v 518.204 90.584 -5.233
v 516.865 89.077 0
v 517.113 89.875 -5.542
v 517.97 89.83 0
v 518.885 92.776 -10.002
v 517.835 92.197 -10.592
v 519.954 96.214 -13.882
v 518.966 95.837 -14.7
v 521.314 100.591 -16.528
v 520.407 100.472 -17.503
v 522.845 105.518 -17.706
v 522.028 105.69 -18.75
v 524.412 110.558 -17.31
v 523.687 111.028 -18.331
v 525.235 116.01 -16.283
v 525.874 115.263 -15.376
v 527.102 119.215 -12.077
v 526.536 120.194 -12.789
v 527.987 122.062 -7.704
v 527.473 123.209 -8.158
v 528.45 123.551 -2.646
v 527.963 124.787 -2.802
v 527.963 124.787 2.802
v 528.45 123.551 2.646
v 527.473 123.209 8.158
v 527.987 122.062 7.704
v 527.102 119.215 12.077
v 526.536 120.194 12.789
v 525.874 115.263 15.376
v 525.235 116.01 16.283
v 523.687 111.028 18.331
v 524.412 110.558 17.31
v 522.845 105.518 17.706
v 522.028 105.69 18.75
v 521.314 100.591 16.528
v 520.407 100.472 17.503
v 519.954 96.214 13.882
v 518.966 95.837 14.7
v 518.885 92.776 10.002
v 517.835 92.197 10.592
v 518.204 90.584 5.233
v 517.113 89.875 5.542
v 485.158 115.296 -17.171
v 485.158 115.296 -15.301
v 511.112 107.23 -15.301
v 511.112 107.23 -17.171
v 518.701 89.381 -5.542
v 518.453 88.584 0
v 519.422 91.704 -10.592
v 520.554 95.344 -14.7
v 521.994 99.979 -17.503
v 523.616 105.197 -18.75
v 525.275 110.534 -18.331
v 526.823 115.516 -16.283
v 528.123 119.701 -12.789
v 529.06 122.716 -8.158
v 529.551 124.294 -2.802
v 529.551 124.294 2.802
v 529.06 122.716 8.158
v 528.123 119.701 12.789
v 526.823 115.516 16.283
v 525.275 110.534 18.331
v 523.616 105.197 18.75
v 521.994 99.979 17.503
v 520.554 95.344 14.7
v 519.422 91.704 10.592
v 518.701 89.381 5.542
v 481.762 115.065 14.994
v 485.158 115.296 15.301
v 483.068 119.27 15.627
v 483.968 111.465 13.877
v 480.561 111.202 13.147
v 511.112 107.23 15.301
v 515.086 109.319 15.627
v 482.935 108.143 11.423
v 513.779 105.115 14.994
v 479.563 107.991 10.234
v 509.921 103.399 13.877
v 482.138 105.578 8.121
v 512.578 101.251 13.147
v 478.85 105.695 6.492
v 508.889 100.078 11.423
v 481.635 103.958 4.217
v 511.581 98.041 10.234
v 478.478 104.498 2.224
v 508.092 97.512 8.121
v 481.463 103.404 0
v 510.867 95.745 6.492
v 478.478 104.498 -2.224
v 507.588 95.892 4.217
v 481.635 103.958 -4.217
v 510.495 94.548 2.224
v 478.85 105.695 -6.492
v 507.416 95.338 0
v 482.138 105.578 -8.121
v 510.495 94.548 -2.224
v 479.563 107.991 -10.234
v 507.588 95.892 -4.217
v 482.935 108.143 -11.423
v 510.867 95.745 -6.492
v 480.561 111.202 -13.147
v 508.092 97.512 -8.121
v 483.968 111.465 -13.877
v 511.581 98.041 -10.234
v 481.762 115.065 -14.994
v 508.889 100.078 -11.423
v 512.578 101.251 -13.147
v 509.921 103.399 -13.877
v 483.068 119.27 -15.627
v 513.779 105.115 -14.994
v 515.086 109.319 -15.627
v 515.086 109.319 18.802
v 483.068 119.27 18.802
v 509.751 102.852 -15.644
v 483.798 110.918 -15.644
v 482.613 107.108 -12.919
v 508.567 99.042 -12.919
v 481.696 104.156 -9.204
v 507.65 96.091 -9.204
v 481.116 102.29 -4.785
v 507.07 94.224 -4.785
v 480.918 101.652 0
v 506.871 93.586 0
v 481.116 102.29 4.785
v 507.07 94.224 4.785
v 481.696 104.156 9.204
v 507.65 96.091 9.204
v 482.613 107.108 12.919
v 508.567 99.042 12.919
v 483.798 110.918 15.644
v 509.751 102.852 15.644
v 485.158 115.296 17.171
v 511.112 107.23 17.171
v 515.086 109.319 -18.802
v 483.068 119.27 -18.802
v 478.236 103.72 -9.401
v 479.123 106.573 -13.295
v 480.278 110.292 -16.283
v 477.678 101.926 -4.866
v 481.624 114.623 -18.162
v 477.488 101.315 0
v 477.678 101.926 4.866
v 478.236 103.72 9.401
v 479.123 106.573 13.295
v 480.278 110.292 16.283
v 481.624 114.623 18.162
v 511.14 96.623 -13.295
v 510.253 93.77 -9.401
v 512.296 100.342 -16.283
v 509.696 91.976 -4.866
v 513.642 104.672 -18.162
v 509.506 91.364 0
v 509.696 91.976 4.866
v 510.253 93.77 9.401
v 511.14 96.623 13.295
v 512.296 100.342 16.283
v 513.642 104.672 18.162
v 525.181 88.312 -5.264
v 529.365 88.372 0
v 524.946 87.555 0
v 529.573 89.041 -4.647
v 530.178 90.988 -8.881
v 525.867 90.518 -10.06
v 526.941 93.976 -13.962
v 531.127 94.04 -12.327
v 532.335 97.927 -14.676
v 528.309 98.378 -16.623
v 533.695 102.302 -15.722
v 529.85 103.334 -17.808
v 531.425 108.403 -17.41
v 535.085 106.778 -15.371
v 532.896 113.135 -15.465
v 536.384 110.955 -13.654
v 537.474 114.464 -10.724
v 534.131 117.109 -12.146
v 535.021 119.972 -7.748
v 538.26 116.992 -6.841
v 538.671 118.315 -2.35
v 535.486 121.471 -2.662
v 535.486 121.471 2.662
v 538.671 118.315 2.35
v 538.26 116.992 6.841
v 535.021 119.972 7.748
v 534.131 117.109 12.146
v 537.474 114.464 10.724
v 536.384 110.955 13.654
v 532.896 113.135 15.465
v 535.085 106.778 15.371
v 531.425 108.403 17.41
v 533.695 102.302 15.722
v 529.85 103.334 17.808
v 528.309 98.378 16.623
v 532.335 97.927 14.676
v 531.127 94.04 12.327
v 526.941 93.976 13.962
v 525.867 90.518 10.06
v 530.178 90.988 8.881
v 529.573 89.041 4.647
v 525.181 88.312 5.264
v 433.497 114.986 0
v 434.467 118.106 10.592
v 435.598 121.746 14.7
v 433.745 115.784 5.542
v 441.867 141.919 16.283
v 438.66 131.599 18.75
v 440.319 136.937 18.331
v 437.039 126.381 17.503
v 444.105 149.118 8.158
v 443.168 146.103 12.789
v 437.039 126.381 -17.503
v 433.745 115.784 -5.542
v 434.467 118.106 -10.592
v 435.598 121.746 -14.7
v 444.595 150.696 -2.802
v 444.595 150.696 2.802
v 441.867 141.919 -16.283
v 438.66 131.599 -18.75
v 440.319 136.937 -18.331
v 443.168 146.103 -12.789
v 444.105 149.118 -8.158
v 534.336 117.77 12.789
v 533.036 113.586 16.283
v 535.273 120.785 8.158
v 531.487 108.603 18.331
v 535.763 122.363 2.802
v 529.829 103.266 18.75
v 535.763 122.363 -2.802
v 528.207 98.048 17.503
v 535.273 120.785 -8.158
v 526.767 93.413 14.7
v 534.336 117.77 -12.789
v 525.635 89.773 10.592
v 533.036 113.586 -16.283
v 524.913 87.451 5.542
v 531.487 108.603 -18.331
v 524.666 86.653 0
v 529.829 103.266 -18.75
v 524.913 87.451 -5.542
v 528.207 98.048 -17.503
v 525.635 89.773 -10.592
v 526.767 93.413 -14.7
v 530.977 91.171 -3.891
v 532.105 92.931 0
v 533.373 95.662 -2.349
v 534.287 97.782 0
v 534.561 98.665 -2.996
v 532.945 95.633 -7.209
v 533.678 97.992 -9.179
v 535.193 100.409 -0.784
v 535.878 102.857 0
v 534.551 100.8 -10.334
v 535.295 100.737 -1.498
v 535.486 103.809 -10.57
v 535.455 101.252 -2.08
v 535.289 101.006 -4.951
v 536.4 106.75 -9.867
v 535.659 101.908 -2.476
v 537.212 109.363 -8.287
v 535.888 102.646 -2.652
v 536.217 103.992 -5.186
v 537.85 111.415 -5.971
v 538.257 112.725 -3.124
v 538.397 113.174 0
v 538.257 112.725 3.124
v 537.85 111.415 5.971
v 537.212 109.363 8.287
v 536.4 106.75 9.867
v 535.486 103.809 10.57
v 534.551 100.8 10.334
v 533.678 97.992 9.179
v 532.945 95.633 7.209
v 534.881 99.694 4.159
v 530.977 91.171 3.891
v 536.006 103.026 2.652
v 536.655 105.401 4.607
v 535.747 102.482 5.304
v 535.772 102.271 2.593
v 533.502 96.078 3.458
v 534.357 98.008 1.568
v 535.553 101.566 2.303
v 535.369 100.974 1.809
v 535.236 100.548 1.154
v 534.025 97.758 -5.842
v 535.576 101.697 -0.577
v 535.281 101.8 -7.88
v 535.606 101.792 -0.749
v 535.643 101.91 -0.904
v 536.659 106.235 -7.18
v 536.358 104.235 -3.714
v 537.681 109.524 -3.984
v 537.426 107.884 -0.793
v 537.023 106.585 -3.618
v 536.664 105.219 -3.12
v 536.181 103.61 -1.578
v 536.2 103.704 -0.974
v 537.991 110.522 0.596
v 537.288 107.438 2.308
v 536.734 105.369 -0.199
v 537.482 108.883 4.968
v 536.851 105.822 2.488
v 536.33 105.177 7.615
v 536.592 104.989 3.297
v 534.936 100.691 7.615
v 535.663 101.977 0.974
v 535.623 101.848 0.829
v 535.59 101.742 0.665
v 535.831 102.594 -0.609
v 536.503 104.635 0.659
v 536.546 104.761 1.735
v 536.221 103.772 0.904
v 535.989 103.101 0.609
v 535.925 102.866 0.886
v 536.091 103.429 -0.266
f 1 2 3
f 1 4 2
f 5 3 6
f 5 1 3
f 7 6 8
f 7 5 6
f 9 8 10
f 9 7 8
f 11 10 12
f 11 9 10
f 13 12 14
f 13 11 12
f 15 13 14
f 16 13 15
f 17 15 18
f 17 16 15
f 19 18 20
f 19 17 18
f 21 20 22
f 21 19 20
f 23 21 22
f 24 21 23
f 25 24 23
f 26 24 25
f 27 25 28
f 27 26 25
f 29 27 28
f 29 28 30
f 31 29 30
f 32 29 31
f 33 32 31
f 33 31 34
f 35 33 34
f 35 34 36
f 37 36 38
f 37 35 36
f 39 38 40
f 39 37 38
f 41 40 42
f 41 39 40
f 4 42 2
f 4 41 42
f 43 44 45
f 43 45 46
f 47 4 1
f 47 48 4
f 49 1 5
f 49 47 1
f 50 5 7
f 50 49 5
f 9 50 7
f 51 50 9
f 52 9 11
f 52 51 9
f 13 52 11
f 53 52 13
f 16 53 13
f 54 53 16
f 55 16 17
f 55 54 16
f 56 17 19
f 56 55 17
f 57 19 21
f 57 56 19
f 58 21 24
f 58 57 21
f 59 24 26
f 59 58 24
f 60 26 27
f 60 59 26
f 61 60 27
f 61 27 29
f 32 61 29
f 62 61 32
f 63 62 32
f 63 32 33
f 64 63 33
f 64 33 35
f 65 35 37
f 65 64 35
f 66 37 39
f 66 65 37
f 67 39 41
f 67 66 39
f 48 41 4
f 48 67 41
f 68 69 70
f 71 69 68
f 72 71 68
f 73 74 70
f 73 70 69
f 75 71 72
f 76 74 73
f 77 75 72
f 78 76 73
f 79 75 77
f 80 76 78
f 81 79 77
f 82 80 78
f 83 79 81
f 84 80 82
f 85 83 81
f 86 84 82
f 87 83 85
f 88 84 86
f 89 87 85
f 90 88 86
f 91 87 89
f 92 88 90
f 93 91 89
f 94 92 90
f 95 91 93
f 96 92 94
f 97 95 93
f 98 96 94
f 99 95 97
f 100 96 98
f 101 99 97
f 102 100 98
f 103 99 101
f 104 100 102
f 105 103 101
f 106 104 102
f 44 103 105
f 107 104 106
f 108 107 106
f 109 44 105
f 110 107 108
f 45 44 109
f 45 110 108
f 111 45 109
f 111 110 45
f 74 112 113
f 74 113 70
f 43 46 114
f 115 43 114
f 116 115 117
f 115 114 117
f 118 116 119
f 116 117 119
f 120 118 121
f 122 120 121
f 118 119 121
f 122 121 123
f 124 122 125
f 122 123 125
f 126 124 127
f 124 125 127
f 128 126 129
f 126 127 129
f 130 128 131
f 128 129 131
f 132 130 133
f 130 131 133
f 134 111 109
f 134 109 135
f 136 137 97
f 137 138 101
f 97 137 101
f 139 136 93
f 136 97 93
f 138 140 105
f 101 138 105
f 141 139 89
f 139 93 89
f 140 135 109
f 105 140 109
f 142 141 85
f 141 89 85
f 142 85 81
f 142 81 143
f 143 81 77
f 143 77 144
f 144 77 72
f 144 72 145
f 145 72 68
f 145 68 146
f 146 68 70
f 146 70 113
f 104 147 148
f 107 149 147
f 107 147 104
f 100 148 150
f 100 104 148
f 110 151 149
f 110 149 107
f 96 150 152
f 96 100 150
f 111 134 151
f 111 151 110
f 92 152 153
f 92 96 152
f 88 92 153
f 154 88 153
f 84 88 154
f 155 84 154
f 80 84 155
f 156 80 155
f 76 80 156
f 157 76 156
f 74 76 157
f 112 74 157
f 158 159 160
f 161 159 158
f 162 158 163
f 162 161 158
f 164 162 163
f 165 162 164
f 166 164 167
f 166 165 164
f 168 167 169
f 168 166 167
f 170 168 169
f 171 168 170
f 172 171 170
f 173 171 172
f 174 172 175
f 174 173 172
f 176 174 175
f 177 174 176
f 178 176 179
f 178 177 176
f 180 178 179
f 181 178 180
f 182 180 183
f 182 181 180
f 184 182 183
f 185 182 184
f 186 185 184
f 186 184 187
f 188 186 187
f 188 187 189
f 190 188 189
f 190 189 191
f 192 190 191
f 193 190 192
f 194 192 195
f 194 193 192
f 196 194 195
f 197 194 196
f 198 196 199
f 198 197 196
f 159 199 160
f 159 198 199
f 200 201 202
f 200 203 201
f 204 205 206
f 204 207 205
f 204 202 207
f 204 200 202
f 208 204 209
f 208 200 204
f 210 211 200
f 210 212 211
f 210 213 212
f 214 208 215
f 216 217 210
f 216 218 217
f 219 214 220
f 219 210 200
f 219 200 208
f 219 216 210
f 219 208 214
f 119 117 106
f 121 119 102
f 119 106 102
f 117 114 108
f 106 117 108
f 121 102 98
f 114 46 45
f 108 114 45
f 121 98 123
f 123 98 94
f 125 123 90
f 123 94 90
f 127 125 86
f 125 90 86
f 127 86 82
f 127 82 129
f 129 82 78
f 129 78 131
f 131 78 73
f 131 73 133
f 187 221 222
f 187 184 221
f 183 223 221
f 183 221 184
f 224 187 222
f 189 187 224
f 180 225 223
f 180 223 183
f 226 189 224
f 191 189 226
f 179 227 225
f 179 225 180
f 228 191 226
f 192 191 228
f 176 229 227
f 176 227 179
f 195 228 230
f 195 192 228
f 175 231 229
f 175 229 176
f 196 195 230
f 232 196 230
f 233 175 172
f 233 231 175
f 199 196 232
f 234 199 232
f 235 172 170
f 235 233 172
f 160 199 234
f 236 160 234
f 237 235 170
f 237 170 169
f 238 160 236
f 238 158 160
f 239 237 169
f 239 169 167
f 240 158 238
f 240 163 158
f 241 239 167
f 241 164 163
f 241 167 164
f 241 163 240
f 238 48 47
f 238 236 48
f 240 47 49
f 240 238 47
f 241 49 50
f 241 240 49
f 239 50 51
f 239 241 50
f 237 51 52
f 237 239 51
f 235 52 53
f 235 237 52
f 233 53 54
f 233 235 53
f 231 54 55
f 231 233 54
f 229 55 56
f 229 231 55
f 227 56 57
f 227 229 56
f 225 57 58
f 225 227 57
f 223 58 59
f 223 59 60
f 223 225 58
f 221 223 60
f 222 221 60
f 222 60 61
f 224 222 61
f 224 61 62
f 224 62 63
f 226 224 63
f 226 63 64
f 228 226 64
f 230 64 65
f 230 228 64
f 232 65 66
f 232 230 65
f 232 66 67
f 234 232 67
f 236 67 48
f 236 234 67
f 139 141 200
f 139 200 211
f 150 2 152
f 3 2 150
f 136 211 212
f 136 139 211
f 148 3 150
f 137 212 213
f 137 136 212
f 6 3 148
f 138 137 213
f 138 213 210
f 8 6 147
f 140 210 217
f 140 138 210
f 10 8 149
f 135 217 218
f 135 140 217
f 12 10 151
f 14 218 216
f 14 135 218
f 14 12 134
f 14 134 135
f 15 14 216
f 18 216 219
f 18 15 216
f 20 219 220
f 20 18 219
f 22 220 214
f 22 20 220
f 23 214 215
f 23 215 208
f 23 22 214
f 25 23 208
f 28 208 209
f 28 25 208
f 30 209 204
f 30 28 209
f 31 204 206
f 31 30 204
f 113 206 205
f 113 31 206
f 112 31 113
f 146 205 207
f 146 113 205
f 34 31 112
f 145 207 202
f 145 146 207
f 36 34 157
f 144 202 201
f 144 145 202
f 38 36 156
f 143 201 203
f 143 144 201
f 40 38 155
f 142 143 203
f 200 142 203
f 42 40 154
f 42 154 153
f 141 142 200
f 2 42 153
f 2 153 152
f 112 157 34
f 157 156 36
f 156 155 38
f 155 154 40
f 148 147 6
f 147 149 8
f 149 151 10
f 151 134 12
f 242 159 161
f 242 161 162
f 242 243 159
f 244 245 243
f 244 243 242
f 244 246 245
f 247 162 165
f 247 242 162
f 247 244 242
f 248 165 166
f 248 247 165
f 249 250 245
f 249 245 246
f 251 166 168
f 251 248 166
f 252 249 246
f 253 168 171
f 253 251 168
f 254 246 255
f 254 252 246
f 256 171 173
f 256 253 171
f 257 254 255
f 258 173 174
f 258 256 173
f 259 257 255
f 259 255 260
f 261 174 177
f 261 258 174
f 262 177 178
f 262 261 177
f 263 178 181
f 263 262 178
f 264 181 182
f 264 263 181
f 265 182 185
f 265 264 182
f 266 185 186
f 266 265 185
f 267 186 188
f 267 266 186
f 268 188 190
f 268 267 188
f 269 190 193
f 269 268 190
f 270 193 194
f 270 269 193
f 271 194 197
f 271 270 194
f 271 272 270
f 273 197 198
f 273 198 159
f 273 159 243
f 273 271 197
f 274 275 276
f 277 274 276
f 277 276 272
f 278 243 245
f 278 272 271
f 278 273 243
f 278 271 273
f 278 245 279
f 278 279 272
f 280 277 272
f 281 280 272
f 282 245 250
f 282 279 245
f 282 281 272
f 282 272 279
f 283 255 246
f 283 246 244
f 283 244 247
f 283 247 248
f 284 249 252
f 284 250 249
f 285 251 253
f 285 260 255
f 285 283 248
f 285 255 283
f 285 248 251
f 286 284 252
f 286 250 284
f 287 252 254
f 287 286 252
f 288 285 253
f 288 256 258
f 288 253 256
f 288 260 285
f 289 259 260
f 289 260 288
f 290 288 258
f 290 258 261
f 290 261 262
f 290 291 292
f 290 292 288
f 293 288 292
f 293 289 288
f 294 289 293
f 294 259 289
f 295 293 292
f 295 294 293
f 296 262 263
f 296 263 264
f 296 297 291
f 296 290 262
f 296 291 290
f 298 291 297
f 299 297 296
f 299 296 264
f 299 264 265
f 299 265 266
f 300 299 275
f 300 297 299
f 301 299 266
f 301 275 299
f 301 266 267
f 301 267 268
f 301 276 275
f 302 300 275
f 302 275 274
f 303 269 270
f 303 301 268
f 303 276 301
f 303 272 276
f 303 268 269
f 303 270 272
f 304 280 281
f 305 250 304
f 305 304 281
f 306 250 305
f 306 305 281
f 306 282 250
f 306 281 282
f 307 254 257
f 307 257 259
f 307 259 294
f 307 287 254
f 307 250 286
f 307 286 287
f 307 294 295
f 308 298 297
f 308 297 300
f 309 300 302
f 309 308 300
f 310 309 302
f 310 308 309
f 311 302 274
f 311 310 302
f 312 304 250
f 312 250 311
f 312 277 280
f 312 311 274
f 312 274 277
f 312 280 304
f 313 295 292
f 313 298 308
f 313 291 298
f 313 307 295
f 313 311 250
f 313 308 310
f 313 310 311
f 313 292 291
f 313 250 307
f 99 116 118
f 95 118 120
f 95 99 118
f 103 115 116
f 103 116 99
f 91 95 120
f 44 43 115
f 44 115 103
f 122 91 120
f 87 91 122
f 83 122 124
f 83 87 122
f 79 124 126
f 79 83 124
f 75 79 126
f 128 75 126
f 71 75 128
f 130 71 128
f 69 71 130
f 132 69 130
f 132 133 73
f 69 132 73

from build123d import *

# Parameters (mm, degrees)
CUT_EXTRUDE1_DEPTH  = 33.528
BOSS_EXTRUDE1_DEPTH = 27.178


with BuildPart() as part:
    # Sketch1 → Revolve1 (revolve)
    with BuildSketch(Plane.XY, mode=Mode.PRIVATE) as revolve1_sk:
        with BuildLine():
            Line((528.025465613, 124.987410399), (528.508452089, 123.740780169))
            Line((528.508452089, 123.740780169), (529.612965613, 124.494048207))
            Line((529.612965613, 124.494048207), (535.825761473, 122.563239653))
            Line((535.825761473, 122.563239653), (535.545433806, 121.661224501))
            Line((535.545433806, 121.661224501), (538.723236555, 118.483421752))
            ThreePointArc((538.723236555, 118.483421752), (537.998073772, 110.543513007), (535.87847289, 102.857466948))
            Line((535.87847289, 102.857466948), (530.245653628, 104.608030762))
            Line((530.245653628, 104.608030762), (439.077442195, 132.941226715))
            Line((439.077442195, 132.941226715), (444.657550041, 150.896435606))
            Line((444.657550041, 150.896435606), (528.025465613, 124.987410399))
        make_face()
    revolve(revolve1_sk.sketch.rotate(Axis((439.077442195, 132.941226715, 0), (0.9549466034375443, -0.29677766860580573, 0)), 180), axis=Axis((439.077442195, 132.941226715, 0), (0.9549466034375443, -0.29677766860580573, 0)))

    # Sketch3 → Cut-Extrude1 (cut)
    with BuildSketch(Plane(origin=(438.736808002, -136.350332617, 0), x_dir=(0, 0, -1), z_dir=(0.9549466034375443, -0.2967776686058057, 0))):
        with BuildLine():
            Line((-19.96170913, 257.260152541), (-15.627317141, 257.260152541))
            ThreePointArc((-15.627317141, 257.260152541), (0, 241.632835399), (15.627317141, 257.260152541))
            Line((15.627317141, 257.260152541), (19.96170913, 257.260152541))
            ThreePointArc((19.96170913, 257.260152541), (0, 237.298443411), (-19.96170913, 257.260152541))
        make_face()
    extrude(amount=-CUT_EXTRUDE1_DEPTH, mode=Mode.SUBTRACT)

    # Sketch4 → Boss-Extrude1 (add)
    with BuildSketch(Plane(origin=(435.704852536, -135.408063519, 0), x_dir=(0, 0, 1), z_dir=(-0.9549466034375443, 0.2967776686058057, 0))):
        with BuildLine():
            Line((17.171437949, 254.085152541), (-17.171437949, 254.085152541))
            ThreePointArc((-17.171437949, 254.085152541), (0, 239.797652541), (17.171437949, 254.085152541))
        make_face()
    extrude(amount=BOSS_EXTRUDE1_DEPTH)


solid = part.part
